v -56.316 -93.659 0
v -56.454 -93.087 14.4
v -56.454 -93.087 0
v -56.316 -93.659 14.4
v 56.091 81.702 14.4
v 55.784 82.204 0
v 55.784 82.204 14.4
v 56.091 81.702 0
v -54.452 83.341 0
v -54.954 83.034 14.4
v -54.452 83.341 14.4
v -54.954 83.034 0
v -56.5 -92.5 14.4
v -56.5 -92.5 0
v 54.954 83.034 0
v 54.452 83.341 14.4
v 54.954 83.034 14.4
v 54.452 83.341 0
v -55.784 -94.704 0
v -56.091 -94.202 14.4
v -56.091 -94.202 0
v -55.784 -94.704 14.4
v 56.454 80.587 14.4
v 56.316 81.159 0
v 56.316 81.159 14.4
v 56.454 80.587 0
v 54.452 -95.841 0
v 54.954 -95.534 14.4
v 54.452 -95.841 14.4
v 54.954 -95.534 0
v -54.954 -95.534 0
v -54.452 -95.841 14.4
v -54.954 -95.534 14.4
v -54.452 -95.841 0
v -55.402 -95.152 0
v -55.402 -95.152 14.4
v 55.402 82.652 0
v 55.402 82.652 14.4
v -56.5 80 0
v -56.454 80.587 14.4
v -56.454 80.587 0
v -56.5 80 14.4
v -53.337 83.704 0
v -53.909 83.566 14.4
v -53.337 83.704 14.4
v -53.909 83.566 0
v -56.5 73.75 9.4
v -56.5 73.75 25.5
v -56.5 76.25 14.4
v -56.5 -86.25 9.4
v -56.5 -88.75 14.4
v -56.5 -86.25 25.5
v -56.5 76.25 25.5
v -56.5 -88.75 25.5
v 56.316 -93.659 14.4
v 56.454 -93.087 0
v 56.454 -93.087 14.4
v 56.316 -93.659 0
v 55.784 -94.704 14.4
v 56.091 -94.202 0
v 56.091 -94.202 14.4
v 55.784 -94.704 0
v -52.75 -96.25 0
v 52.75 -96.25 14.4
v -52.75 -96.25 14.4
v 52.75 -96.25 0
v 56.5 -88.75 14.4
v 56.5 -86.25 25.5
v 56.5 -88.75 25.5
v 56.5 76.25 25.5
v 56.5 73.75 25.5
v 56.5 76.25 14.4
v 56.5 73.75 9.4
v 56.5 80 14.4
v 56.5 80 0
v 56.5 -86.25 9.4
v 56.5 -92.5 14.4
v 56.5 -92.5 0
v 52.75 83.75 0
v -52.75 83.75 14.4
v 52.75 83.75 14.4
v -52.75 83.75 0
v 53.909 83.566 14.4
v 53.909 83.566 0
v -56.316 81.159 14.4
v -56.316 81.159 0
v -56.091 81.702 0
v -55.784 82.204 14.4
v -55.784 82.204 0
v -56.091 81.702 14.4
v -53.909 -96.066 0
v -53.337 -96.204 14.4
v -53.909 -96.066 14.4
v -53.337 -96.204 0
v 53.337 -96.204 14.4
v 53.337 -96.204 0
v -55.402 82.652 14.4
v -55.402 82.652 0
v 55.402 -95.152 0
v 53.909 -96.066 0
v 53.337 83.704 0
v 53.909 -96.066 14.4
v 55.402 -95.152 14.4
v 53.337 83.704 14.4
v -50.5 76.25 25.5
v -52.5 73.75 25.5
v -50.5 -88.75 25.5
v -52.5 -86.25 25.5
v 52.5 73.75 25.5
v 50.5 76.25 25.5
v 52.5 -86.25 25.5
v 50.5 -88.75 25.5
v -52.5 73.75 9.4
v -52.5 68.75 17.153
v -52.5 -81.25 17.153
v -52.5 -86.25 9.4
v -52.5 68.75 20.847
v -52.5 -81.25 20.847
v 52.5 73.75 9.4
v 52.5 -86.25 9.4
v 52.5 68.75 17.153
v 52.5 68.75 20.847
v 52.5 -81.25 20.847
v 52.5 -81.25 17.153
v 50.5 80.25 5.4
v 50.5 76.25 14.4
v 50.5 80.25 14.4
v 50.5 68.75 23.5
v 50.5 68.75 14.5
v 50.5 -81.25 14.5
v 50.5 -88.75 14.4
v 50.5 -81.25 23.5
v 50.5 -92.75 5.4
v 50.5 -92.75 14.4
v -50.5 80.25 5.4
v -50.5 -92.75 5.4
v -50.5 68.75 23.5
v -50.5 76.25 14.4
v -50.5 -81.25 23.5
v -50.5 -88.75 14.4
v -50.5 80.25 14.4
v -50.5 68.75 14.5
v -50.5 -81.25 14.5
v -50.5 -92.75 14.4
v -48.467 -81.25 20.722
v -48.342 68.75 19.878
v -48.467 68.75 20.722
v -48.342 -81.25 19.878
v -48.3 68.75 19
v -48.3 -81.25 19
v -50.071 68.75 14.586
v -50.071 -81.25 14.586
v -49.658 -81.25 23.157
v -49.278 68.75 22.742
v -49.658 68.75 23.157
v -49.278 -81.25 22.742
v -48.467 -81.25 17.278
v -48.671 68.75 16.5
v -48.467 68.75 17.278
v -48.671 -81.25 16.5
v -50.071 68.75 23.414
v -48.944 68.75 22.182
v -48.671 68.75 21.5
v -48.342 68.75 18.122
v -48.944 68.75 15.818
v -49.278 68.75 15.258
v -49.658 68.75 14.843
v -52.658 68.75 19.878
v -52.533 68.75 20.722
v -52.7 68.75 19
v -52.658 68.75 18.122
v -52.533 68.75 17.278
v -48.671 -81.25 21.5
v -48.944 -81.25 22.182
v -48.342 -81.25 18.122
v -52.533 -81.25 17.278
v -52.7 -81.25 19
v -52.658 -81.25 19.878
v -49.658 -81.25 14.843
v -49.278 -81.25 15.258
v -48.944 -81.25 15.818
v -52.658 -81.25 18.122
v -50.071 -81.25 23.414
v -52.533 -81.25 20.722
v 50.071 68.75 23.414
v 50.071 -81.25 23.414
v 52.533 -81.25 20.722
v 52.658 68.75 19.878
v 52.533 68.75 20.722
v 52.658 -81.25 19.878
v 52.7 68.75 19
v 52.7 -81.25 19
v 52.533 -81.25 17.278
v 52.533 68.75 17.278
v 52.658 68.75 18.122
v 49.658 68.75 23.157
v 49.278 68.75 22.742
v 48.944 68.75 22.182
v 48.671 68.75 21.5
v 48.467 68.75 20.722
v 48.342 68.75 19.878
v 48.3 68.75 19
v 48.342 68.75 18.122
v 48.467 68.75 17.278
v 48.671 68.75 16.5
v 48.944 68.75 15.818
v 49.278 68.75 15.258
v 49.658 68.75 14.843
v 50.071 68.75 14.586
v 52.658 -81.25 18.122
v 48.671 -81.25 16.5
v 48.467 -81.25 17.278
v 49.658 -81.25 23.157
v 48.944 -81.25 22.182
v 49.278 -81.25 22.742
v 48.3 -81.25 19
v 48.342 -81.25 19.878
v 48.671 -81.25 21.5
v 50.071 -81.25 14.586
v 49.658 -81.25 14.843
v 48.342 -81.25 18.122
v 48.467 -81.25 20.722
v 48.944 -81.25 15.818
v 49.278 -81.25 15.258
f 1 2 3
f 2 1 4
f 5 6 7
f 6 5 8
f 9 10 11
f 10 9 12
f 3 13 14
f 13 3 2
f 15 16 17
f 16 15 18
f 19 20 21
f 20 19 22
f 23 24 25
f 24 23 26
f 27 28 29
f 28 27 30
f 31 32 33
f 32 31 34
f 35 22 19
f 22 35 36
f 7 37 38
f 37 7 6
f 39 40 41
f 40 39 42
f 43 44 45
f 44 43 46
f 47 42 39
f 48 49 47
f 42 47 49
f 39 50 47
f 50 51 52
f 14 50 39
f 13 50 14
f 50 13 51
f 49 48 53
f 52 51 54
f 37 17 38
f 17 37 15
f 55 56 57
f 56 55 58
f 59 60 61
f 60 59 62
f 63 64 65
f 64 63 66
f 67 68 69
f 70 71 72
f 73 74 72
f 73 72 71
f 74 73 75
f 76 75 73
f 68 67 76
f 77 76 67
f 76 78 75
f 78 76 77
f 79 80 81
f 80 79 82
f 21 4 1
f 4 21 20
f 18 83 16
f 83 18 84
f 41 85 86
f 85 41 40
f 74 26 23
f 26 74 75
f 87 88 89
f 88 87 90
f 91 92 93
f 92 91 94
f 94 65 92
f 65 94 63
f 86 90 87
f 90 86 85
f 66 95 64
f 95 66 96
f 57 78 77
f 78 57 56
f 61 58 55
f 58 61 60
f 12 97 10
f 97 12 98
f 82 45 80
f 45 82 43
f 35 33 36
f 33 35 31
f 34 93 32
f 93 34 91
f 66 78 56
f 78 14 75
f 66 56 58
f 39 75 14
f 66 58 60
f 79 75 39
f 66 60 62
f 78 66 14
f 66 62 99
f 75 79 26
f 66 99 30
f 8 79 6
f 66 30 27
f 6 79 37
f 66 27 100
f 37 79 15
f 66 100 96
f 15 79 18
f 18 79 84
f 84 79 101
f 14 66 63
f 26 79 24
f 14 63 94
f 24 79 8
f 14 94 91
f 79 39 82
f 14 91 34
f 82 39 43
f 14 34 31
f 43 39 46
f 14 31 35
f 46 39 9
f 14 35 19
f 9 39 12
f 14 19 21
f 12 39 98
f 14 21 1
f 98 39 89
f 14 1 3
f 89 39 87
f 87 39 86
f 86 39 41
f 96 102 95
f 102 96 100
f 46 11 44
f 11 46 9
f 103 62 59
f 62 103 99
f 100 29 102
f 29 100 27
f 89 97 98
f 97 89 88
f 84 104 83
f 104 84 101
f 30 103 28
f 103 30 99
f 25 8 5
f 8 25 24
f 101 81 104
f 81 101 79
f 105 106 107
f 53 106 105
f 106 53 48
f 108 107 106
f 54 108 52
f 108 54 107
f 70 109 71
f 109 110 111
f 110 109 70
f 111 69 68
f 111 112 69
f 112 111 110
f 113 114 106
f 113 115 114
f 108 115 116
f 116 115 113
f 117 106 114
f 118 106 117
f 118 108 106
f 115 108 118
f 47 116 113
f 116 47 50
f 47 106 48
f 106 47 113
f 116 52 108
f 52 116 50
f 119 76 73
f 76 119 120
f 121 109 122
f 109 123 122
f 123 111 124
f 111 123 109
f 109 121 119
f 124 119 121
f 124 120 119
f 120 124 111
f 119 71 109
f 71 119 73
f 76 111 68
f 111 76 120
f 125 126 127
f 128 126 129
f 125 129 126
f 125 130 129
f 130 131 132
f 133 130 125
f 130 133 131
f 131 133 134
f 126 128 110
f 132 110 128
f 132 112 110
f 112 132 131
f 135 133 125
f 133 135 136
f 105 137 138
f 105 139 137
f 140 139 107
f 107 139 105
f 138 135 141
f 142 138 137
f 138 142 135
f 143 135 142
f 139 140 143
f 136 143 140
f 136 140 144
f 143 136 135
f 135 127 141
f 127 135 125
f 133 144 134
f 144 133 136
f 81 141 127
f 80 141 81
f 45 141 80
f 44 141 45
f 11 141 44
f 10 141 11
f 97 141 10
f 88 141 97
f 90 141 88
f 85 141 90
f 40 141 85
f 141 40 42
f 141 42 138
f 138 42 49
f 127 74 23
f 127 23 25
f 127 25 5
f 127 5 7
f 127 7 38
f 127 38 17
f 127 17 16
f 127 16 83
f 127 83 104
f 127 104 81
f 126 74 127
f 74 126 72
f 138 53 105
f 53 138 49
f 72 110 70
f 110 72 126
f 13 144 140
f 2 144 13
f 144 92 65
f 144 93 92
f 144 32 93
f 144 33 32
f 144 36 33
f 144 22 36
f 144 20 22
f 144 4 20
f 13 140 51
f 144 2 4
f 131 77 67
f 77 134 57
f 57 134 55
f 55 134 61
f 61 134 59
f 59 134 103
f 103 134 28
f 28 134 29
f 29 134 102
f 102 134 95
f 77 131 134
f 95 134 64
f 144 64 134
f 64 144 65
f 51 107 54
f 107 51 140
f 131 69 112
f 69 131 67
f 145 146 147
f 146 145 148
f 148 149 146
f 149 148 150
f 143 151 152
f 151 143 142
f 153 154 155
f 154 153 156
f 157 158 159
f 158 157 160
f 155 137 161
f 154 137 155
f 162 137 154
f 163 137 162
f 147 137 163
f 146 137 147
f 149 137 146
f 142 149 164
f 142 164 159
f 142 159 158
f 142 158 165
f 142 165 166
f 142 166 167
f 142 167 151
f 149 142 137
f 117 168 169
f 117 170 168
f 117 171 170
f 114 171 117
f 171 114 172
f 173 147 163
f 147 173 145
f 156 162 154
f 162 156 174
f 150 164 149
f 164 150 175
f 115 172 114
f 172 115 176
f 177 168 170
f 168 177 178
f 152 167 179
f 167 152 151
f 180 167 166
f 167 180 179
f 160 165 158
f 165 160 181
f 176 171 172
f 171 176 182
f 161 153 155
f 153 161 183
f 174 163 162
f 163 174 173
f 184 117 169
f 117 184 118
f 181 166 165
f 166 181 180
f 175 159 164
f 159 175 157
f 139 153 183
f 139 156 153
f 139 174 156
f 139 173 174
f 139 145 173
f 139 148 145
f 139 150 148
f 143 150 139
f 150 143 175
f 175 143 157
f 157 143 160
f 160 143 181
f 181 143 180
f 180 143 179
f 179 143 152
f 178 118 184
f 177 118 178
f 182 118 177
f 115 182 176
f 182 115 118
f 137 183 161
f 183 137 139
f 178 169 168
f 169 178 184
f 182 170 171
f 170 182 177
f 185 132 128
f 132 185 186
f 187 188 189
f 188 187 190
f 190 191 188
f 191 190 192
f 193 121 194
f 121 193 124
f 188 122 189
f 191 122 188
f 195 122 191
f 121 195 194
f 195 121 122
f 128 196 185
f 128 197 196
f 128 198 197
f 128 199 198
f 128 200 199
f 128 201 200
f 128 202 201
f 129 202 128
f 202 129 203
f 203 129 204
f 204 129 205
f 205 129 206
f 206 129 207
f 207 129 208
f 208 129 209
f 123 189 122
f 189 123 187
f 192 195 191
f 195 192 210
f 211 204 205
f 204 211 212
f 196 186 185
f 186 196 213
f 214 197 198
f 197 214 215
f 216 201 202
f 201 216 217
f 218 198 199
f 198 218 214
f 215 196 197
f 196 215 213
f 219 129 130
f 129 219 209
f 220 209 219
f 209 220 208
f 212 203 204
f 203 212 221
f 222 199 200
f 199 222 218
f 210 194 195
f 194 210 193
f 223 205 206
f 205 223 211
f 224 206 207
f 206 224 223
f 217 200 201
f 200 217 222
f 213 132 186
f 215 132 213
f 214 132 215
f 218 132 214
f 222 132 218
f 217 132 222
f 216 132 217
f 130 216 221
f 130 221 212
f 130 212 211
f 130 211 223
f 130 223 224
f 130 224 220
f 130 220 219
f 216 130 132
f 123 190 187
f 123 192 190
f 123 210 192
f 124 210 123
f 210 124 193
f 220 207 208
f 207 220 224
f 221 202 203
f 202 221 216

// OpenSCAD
// file: bin_shortkiller.scad
// bin_shortkiller — a Gridfinity bin that cradles the Shortkiller.
//
// FOOT is NX_CRADLE x NY_CRADLE cells of stock Gridfinity, so it clicks into
// the ENGINDOT plate — or any other Clickfinity / Gridfinity baseplate. BODY
// flares out above the foot in BOTH axes:
//
//   * ACROSS, to clear a box wider than the grid, so the plate can stay narrow
//     and hug the supply
//   * FORWARD, to make room for a lip at each end. The box is 171 mm and a
//     4-cell foot is 167.5, so without this there is nothing for a front lip to
//     stand on. The extension is entirely at the front — a rear one would run
//     into the probe bucket in the next cell.
//
// Both flares are 45-degree ramps finishing below the pocket floor. A step
// instead of a ramp needs support; a ramp running past the floor would have the
// pocket cut the side walls away where they are still narrow.
//
// Not a stock bin(): the box is operated in place, so both end lips are LOW —
// the rear clears the DC jack and rocker, the front clears the GX12 connector
// and the V+/V- buttons.
//
// Parameters let one module serve every coupon, so they cannot drift:
//   foot  = false  swap the Gridfinity base for a flat slab (grip coupon)
//   lips  = false  open front, no forward extension (original cross-section)
//
// PRINT: flat, foot down, no supports. PETG if it lives in a Clickfinity plate.
include <../lib/gridfinity.scad>
include <shortkiller_common.scad>

GRIP_BASE_T = 3.0;   // flat base thickness when foot = false

// Rounded rect as a hull of four circles — deliberately NOT the
// offset(r) offset(-r) idiom lib/gridfinity.scad uses. That chain emits
// near-coincident vertices at some $fn values and the mesh goes non-manifold;
// this construction is stable at every $fn tested.
module _rrect(w, d) {
    hull() for (x = [-1, 1], y = [-1, 1])
        translate([x * (w / 2 - BIN_R), y * (d / 2 - BIN_R)]) circle(r = BIN_R);
}

module grip_bump(side, len, top_z, yc) {
    // Ridge running fore-aft on the flexure's inner face. Horizontal axis so the
    // box cams the flexure outward as it drops in, instead of catching on it.
    translate([side * POCKET_W / 2, yc, top_z - BUMP_H / 2 - 2])
        scale([BUMP_REACH / (BUMP_H / 2), 1, 1])
            rotate([90, 0, 0])
                cylinder(r = BUMP_H / 2, h = len, center = true, $fn = 32);
}

module bin_shortkiller(ny = NY_CRADLE, foot = true, lips = true) {
    D       = ny * GF - 0.5;              // foot length
    ext     = lips ? FRONT_EXT : 0;       // forward overhang past the foot
    BD      = D + ext;                    // body length
    yc      = -ext / 2;                   // body centre, shifted forward
    y_front = -(D / 2 + ext);             // body front face
    y_rear  = D / 2;                      // body rear face

    base_h  = foot ? BIN_BASE_H + CHAMF : GRIP_BASE_T;
    floor_z = base_h + FLOOR_T;
    top_z   = floor_z + (BIN_H - FLOOR_Z);  // identical grip geometry either way

    // pocket runs between the two lip inner faces
    p_front = lips ? y_front + LIP_T : y_front - 10;
    p_rear  = y_rear - BACKSTOP_T;

    union() {
        difference() {
            union() {
                if (foot) {
                    // Feet only — deliberately NOT bin_blank(). bin_blank builds
                    // its block with offset(R) offset(-R) square(), while the
                    // flare below uses _rrect (hull of circles). Unioning two
                    // nominally identical rectangles built different ways leaves
                    // faces coincident to within tessellation error, and the mesh
                    // goes non-manifold on some OpenSCAD builds but not others —
                    // it passed locally and failed in CI. One construction only.
                    for (ix = [0 : NX_CRADLE-1], iy = [0 : ny-1])
                        translate([(ix - (NX_CRADLE-1)/2) * GF,
                                   (iy - (ny-1)/2) * GF, 0]) _bin_foot();

                    // 45-degree flare, grid footprint out to body footprint
                    hull() {
                        translate([0, 0, BIN_BASE_H])
                            linear_extrude(EPS) _rrect(FOOT_W, D);
                        translate([0, yc, BIN_BASE_H + CHAMF])
                            linear_extrude(EPS) _rrect(BODY_W, BD);
                    }
                } else {
                    translate([0, yc, 0])
                        linear_extrude(GRIP_BASE_T) _rrect(BODY_W, BD);
                }

                // straight body above the base
                translate([0, yc, base_h])
                    linear_extrude(top_z - base_h) _rrect(BODY_W, BD);
            }

            // pocket
            translate([-POCKET_W / 2, p_front, floor_z])
                cube([POCKET_W, p_rear - p_front, top_z]);

            // rear lip trimmed to BACKSTOP_H. Overshoot INTO the pocket — a cut
            // ending flush with the pocket face leaves a coincident face and the
            // mesh goes non-manifold.
            translate([-BODY_W / 2 - 1, p_rear - 4, floor_z + BACKSTOP_H])
                cube([BODY_W + 2, BACKSTOP_T + 6, top_z]);

            // front lip trimmed to FRONT_LIP_H, same overshoot
            if (lips)
                translate([-BODY_W / 2 - 1, y_front - 1, floor_z + FRONT_LIP_H])
                    cube([BODY_W + 2, LIP_T + 5, top_z]);

            // flexure relief — thin each side wall from its OUTER face, inset
            // from both ends so the rounded outer corners stay solid
            for (s = [-1, 1])
                translate([s > 0 ? POCKET_W / 2 + FLEX_T : -BODY_W / 2 - 2,
                           y_front + RELIEF_INSET,
                           floor_z + FLEX_START])
                    cube([SIDE_WALL - FLEX_T + 2,
                          BD - 2 * RELIEF_INSET,
                          top_z]);
        }

        for (s = [-1, 1])
            grip_bump(s, BD - 2 * RELIEF_INSET - 10, top_z, yc);
    }
}

bin_shortkiller();
// file: ../lib/gridfinity.scad
// SPDX-License-Identifier: MIT
// Copyright (c) 2026 Aaron Cupp
//
// gridfinity.scad — shared Gridfinity baseplate + bin library (per spec).
//
// 42 mm pitch, 41.5 mm bins, baseplate socket 0.7/1.8/2.15 = 4.65 mm, 4 mm
// fillet; bin foot 0.8/1.8/2.15 = 4.75 mm, 3.75 mm corner radius. Verified the
// bin foot seats in the baseplate socket with ~0.25–0.5 mm clearance.
//
//   baseplate(nx, ny)                      — tiled receiving baseplate
//   bin_blank(nx, ny, h)                   — solid bin body (feet + block, no cavity)
//   bin(nx, ny, h, wall, floor)            — open Gridfinity bin
//   divided_bin(nx, ny, h, cols, rows, …)  — bin with internal compartments
//   lid(nx, ny, …)                         — friction lid for a bin of the same footprint
//   stack_base(nx, ny, h, …)               — baseplate-topped base; a bin socket-stacks on it

GF = 42; GF_FILLET = 4;
_C_TOP = 2.15; _C_MID = 1.8; _C_BOT = 0.7;
_BP_LIP = _C_TOP + _C_MID + _C_BOT; _BP_FLOOR = 1.2; BP_H = _BP_LIP + _BP_FLOOR;  // 5.85
BIN_SZ = 41.5; BIN_R = 3.75; BIN_BASE_H = 4.75;

// ---- baseplate ----
module _bp_cell(i = 0) { offset(r = -i) offset(r = GF_FILLET) offset(r = -GF_FILLET) square(GF, center = true); }
module _bp_socket() {
    e = 0.01;
    hull() { translate([0,0,BP_H-e]) linear_extrude(e) _bp_cell(0); translate([0,0,BP_H-_C_TOP]) linear_extrude(e) _bp_cell(_C_TOP); }
    translate([0,0,BP_H-_C_TOP-_C_MID]) linear_extrude(_C_MID) _bp_cell(_C_TOP);
    hull() { translate([0,0,BP_H-_C_TOP-_C_MID-e]) linear_extrude(e) _bp_cell(_C_TOP); translate([0,0,BP_H-_BP_LIP]) linear_extrude(e) _bp_cell(_C_TOP+_C_BOT); }
}
module baseplate(nx, ny) {
    w = nx*GF; d = ny*GF;
    difference() {
        translate([0,0,BP_H/2]) linear_extrude(BP_H, center=true) offset(GF_FILLET) offset(-GF_FILLET) square([w,d], center=true);
        for (ix=[0:nx-1], iy=[0:ny-1]) translate([(ix-(nx-1)/2)*GF, (iy-(ny-1)/2)*GF, 0]) _bp_socket();
    }
}

// ---- bin ----
module _bin_cell(i = 0) { offset(r = -i) offset(r = BIN_R) offset(r = -BIN_R) square(BIN_SZ, center = true); }
module _bin_foot() {
    e = 0.01;
    hull() { linear_extrude(e) _bin_cell(2.95); translate([0,0,0.8]) linear_extrude(e) _bin_cell(2.15); }    // bottom chamfer
    translate([0,0,0.8]) linear_extrude(1.8) _bin_cell(2.15);                                                 // vertical
    hull() { translate([0,0,2.6]) linear_extrude(e) _bin_cell(2.15); translate([0,0,BIN_BASE_H]) linear_extrude(e) _bin_cell(0); } // top chamfer
}
// Solid bin body: Gridfinity feet + the block above them, with no cavity cut.
// Cup-style bins (lib/vessel.scad) subtract their own bores from this instead of
// re-deriving the foot + shell union.
module bin_blank(nx, ny, h) {
    W = nx*GF - 0.5; D = ny*GF - 0.5;
    union() {
        for (ix=[0:nx-1], iy=[0:ny-1]) translate([(ix-(nx-1)/2)*GF, (iy-(ny-1)/2)*GF, 0]) _bin_foot();
        translate([0,0,BIN_BASE_H]) linear_extrude(h-BIN_BASE_H) offset(BIN_R) offset(-BIN_R) square([W,D], center=true);
    }
}

module _bin_shell(nx, ny, h, wall, floor) {
    W = nx*GF - 0.5; D = ny*GF - 0.5;
    difference() {
        bin_blank(nx, ny, h);
        translate([0,0,BIN_BASE_H+floor]) linear_extrude(h) offset(BIN_R-wall) offset(-(BIN_R-wall)) square([W-2*wall, D-2*wall], center=true);
    }
}
module bin(nx, ny, h, wall = 1.2, floor = 1.4) { _bin_shell(nx, ny, h, wall, floor); }

// ---- stacking base ----
// A bin whose TOP is a Gridfinity baseplate, so a standard bin socket-stacks on
// it (two-tier towers: instrument on top, cords/jig/adapters in the base). The
// base is open at the FRONT (−Y) by default so the lower item is reachable while
// the top tier stays socketed — same idea as drybox-splitter-stand's open cubby.
// The whole tower foots on the bench baseplate via this base's own foot.
//
//   h = interior height of the lower compartment (floor to the baseplate cap).
module stack_base(nx, ny, h, wall = 1.2, floor = 1.4, open_front = true) {
    W = nx*GF - 0.5; D = ny*GF - 0.5;
    z0 = BIN_BASE_H + floor;
    iw = W - 2*wall; id = D - 2*wall;
    difference() {
        union() {
            bin_blank(nx, ny, h);                    // solid foot + block to h
            translate([0,0,h]) baseplate(nx, ny);    // baseplate cap (sockets up)
        }
        // lower cavity, floor up to the cap underside
        translate([0,0,z0]) linear_extrude(h - z0 + 0.01)
            offset(BIN_R-wall) offset(-(BIN_R-wall)) square([iw, id], center=true);
        // open front: cut the −Y wall so you reach in under the cap
        if (open_front)
            translate([-iw/2, -D, z0]) cube([iw, D/2 + 0.01, h - z0 + 0.01]);
    }
}

module divided_bin(nx, ny, h, cols = 1, rows = 1, wall = 1.2, floor = 1.4, div = 1.2) {
    W = nx*GF - 0.5; D = ny*GF - 0.5;
    union() {
        bin(nx, ny, h, wall, floor);
        // internal divider walls (from the floor up to the rim)
        iw = W - 2*wall; id = D - 2*wall; z0 = BIN_BASE_H + floor;
        for (c = [1 : cols-1]) translate([-iw/2 + c*iw/cols - div/2, -id/2, z0]) cube([div, id, h - z0]);
        for (r = [1 : rows-1]) translate([-iw/2, -id/2 + r*id/rows - div/2, z0]) cube([iw, div, h - z0]);
    }
}

// ---- lid ----
// Friction lid for a bin of the same footprint: a flat plate with a skirt that
// drops into the bin's cavity. Emitted PRINT-READY — plate on the bed, skirt
// standing up — so it needs no supports. Flip it in your head to picture it
// fitted: the plate then caps the rim and the lid adds `t` to the stack height.
//
// Why lids exist here: full-extension drawer slides let small parts hop between
// compartments on a hard close, and brass inserts aren't magnetic — you can't
// sweep them back. `wall` must match the bin's wall so the skirt lands in the
// cavity; `clearance` is per-side slop between skirt and cavity.
module lid(nx, ny, t = 1.6, skirt = 4, wall = 1.2, clearance = 0.35, lid_wall = 1.6) {
    W = nx*GF - 0.5; D = ny*GF - 0.5;
    iw = W - 2*wall - 2*clearance; id = D - 2*wall - 2*clearance;   // skirt outer
    ir = BIN_R - wall;                                              // cavity corner radius
    union() {
        linear_extrude(t) offset(BIN_R) offset(-BIN_R) square([W, D], center=true);
        translate([0,0,t]) linear_extrude(skirt) difference() {
            offset(ir) offset(-ir) square([iw, id], center=true);
            offset(ir-lid_wall) offset(-(ir-lid_wall)) square([iw-2*lid_wall, id-2*lid_wall], center=true);
        }
    }
}
// main file
// bin_shortkiller_griptest — FULL-LENGTH grip coupon. No Gridfinity base.
//
// The one thing bin_shortkiller_testfit could NOT tell you: how the flexures
// behave at their real span. That coupon is 2 cells, so its walls span ~63 mm
// against the real 147 mm, and beam stiffness goes as 1/length^3 — it grips
// several times too hard. This part has the true span.
//
// It also skips the entire Gridfinity base. In the real bin the pocket floor
// sits 21.9 mm up — feet, then the 45-degree flare ramp, then the floor — and
// none of that is doing anything for grip. Here it is a 3 mm slab instead.
// Everything above the floor is IDENTICAL geometry, from the same module.
//
// What it answers:
//   * do the bumps hold the box, or does it rock, at full span
//   * does the 9 mm backstop clear the rear DC jack and rocker
//   * does the box overhang look right at 171 mm in a 167.5 mm bin
//
// What it cannot answer: anything about seating in a plate — it has no foot.
// bin_shortkiller_testfit already covered that.
//
// PRINT: flat, slab down, no supports.
include <../lib/gridfinity.scad>
include <shortkiller_common.scad>
use <bin_shortkiller.scad>

bin_shortkiller(NY_CRADLE, foot = false);
